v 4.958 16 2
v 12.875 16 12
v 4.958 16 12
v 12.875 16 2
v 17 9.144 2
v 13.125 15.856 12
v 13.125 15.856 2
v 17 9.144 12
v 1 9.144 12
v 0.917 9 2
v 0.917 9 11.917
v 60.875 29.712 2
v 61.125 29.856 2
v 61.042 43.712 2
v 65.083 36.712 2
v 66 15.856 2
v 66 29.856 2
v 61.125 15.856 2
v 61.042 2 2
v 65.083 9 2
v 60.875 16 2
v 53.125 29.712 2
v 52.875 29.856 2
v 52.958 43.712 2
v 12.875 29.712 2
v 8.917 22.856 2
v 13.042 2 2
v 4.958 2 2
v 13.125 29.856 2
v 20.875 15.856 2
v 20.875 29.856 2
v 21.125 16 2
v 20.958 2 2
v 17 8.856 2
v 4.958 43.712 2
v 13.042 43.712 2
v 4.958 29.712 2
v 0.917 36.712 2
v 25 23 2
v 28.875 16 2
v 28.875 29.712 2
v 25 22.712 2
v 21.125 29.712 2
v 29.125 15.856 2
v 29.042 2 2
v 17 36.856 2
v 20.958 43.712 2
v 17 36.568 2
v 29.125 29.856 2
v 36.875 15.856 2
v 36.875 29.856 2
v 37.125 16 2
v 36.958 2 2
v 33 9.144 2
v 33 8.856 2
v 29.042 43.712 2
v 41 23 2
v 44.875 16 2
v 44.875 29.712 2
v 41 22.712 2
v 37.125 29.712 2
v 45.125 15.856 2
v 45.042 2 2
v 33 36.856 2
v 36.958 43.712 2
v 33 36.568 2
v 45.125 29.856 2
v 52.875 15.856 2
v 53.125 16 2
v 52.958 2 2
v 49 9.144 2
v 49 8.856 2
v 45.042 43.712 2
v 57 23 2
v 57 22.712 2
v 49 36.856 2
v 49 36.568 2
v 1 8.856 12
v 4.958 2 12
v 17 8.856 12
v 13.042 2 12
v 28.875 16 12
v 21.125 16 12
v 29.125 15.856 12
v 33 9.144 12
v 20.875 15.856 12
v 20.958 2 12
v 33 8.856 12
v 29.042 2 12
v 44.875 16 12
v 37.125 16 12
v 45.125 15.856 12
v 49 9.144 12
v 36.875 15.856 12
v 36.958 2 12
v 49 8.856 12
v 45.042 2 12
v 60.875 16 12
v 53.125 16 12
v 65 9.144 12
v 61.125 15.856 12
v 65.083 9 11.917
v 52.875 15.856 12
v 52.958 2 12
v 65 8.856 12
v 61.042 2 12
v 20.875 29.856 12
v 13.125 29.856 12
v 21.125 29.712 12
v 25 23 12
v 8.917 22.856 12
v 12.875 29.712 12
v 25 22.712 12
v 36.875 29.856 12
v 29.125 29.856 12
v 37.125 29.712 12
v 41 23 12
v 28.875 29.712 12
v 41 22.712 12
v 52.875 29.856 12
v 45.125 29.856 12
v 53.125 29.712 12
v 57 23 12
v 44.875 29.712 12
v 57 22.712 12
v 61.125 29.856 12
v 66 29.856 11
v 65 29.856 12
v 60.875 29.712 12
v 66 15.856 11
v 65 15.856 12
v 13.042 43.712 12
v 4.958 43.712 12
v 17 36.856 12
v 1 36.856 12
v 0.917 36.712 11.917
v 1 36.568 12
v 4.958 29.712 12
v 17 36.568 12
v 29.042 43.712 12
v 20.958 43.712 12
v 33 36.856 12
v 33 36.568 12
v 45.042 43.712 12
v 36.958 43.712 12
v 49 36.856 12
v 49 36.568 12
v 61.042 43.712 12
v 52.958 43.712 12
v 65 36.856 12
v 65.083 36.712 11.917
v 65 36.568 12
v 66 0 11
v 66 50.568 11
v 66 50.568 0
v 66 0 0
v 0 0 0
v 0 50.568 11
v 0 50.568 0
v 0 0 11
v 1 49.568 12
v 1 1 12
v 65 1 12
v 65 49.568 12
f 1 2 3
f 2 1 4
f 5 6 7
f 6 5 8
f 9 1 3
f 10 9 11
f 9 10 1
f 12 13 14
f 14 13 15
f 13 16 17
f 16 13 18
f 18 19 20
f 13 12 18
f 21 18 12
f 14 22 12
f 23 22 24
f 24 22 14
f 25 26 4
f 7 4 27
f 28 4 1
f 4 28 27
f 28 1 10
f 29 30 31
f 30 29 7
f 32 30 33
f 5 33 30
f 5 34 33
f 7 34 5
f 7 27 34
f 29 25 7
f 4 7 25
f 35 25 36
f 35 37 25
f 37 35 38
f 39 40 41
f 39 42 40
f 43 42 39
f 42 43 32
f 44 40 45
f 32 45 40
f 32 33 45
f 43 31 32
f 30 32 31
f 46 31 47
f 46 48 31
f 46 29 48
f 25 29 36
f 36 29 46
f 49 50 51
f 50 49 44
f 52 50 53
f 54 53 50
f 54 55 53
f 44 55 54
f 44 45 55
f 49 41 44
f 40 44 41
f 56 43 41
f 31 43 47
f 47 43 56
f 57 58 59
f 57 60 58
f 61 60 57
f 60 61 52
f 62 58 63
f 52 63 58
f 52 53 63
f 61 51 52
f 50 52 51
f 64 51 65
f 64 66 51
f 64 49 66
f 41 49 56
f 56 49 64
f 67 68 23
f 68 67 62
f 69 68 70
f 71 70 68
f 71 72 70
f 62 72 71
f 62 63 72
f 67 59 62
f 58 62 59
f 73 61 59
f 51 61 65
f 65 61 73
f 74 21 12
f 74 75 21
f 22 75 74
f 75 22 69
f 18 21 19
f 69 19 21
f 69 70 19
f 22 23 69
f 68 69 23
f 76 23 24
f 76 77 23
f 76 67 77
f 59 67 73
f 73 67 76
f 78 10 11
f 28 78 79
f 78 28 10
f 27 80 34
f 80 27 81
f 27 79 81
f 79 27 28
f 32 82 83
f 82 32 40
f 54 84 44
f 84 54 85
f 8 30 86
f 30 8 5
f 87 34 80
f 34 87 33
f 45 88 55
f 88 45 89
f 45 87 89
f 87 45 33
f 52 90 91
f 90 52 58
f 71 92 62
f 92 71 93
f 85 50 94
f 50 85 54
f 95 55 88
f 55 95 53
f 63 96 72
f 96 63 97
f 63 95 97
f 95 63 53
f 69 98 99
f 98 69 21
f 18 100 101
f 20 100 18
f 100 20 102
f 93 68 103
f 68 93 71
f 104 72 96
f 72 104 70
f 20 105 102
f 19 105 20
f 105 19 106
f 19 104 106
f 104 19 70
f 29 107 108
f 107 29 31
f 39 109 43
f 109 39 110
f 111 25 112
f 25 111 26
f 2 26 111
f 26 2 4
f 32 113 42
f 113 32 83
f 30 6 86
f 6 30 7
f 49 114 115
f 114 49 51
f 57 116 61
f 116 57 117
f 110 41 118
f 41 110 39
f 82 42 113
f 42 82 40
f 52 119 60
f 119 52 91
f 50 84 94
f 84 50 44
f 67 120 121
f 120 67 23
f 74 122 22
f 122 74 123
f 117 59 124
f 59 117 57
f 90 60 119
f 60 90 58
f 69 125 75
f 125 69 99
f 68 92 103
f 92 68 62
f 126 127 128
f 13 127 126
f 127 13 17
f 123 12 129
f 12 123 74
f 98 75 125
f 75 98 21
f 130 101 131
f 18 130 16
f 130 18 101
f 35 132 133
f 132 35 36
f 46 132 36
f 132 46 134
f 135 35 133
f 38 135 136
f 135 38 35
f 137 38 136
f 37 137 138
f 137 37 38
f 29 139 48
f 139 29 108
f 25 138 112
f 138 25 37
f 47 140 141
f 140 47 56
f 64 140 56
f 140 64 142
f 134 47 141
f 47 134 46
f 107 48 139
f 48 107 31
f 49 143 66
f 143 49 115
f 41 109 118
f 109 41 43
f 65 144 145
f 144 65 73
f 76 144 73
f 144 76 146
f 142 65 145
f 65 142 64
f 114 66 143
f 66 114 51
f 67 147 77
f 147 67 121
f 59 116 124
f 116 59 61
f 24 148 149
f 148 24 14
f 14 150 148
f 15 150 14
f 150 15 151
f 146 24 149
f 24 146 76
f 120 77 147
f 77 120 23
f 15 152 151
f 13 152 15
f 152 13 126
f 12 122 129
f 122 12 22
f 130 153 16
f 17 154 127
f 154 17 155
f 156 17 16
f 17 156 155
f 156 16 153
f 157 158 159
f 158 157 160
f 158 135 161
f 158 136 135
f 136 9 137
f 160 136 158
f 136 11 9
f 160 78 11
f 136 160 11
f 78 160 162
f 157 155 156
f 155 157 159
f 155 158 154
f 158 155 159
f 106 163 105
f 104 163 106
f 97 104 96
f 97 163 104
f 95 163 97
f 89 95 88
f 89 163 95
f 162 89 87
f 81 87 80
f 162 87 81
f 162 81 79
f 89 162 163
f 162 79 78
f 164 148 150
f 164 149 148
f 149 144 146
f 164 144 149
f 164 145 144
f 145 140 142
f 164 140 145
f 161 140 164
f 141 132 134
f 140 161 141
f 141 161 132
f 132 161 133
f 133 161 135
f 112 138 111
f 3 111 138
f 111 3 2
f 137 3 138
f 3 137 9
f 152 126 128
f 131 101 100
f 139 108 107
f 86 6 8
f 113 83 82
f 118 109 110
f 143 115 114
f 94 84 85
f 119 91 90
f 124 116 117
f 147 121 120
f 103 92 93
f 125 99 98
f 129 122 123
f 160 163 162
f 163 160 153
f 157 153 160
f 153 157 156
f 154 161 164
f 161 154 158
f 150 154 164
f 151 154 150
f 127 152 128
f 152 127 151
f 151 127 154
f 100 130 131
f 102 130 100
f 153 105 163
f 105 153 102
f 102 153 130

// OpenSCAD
// A tray of hexagonal pockets for small parts. Plain OpenSCAD, no libraries.
cols = 4;
rows = 3;
across = 14;     // pocket across flats
depth = 10;
wall = 2;
floor_t = 2;
rim = 1;         // chamfer on the top edge

pitch_x = across + wall;
pitch_y = (across + wall) * 0.866;
size_x = cols * pitch_x + wall;
size_y = rows * pitch_y + across * 0.5 + wall;

module pocket() {
    cylinder(d = across / 0.866, h = depth + 1, $fn = 6);
}

difference() {
    hull() {
        cube([size_x, size_y, depth + floor_t - rim]);
        translate([rim, rim, 0]) cube([size_x - 2 * rim, size_y - 2 * rim, depth + floor_t]);
    }
    for (r = [0 : rows - 1]) for (c = [0 : cols - 1])
        translate([wall + across / 2 + c * pitch_x + (r % 2) * pitch_x / 2, wall + across / 2 + r * pitch_y, floor_t])
            pocket();
}
